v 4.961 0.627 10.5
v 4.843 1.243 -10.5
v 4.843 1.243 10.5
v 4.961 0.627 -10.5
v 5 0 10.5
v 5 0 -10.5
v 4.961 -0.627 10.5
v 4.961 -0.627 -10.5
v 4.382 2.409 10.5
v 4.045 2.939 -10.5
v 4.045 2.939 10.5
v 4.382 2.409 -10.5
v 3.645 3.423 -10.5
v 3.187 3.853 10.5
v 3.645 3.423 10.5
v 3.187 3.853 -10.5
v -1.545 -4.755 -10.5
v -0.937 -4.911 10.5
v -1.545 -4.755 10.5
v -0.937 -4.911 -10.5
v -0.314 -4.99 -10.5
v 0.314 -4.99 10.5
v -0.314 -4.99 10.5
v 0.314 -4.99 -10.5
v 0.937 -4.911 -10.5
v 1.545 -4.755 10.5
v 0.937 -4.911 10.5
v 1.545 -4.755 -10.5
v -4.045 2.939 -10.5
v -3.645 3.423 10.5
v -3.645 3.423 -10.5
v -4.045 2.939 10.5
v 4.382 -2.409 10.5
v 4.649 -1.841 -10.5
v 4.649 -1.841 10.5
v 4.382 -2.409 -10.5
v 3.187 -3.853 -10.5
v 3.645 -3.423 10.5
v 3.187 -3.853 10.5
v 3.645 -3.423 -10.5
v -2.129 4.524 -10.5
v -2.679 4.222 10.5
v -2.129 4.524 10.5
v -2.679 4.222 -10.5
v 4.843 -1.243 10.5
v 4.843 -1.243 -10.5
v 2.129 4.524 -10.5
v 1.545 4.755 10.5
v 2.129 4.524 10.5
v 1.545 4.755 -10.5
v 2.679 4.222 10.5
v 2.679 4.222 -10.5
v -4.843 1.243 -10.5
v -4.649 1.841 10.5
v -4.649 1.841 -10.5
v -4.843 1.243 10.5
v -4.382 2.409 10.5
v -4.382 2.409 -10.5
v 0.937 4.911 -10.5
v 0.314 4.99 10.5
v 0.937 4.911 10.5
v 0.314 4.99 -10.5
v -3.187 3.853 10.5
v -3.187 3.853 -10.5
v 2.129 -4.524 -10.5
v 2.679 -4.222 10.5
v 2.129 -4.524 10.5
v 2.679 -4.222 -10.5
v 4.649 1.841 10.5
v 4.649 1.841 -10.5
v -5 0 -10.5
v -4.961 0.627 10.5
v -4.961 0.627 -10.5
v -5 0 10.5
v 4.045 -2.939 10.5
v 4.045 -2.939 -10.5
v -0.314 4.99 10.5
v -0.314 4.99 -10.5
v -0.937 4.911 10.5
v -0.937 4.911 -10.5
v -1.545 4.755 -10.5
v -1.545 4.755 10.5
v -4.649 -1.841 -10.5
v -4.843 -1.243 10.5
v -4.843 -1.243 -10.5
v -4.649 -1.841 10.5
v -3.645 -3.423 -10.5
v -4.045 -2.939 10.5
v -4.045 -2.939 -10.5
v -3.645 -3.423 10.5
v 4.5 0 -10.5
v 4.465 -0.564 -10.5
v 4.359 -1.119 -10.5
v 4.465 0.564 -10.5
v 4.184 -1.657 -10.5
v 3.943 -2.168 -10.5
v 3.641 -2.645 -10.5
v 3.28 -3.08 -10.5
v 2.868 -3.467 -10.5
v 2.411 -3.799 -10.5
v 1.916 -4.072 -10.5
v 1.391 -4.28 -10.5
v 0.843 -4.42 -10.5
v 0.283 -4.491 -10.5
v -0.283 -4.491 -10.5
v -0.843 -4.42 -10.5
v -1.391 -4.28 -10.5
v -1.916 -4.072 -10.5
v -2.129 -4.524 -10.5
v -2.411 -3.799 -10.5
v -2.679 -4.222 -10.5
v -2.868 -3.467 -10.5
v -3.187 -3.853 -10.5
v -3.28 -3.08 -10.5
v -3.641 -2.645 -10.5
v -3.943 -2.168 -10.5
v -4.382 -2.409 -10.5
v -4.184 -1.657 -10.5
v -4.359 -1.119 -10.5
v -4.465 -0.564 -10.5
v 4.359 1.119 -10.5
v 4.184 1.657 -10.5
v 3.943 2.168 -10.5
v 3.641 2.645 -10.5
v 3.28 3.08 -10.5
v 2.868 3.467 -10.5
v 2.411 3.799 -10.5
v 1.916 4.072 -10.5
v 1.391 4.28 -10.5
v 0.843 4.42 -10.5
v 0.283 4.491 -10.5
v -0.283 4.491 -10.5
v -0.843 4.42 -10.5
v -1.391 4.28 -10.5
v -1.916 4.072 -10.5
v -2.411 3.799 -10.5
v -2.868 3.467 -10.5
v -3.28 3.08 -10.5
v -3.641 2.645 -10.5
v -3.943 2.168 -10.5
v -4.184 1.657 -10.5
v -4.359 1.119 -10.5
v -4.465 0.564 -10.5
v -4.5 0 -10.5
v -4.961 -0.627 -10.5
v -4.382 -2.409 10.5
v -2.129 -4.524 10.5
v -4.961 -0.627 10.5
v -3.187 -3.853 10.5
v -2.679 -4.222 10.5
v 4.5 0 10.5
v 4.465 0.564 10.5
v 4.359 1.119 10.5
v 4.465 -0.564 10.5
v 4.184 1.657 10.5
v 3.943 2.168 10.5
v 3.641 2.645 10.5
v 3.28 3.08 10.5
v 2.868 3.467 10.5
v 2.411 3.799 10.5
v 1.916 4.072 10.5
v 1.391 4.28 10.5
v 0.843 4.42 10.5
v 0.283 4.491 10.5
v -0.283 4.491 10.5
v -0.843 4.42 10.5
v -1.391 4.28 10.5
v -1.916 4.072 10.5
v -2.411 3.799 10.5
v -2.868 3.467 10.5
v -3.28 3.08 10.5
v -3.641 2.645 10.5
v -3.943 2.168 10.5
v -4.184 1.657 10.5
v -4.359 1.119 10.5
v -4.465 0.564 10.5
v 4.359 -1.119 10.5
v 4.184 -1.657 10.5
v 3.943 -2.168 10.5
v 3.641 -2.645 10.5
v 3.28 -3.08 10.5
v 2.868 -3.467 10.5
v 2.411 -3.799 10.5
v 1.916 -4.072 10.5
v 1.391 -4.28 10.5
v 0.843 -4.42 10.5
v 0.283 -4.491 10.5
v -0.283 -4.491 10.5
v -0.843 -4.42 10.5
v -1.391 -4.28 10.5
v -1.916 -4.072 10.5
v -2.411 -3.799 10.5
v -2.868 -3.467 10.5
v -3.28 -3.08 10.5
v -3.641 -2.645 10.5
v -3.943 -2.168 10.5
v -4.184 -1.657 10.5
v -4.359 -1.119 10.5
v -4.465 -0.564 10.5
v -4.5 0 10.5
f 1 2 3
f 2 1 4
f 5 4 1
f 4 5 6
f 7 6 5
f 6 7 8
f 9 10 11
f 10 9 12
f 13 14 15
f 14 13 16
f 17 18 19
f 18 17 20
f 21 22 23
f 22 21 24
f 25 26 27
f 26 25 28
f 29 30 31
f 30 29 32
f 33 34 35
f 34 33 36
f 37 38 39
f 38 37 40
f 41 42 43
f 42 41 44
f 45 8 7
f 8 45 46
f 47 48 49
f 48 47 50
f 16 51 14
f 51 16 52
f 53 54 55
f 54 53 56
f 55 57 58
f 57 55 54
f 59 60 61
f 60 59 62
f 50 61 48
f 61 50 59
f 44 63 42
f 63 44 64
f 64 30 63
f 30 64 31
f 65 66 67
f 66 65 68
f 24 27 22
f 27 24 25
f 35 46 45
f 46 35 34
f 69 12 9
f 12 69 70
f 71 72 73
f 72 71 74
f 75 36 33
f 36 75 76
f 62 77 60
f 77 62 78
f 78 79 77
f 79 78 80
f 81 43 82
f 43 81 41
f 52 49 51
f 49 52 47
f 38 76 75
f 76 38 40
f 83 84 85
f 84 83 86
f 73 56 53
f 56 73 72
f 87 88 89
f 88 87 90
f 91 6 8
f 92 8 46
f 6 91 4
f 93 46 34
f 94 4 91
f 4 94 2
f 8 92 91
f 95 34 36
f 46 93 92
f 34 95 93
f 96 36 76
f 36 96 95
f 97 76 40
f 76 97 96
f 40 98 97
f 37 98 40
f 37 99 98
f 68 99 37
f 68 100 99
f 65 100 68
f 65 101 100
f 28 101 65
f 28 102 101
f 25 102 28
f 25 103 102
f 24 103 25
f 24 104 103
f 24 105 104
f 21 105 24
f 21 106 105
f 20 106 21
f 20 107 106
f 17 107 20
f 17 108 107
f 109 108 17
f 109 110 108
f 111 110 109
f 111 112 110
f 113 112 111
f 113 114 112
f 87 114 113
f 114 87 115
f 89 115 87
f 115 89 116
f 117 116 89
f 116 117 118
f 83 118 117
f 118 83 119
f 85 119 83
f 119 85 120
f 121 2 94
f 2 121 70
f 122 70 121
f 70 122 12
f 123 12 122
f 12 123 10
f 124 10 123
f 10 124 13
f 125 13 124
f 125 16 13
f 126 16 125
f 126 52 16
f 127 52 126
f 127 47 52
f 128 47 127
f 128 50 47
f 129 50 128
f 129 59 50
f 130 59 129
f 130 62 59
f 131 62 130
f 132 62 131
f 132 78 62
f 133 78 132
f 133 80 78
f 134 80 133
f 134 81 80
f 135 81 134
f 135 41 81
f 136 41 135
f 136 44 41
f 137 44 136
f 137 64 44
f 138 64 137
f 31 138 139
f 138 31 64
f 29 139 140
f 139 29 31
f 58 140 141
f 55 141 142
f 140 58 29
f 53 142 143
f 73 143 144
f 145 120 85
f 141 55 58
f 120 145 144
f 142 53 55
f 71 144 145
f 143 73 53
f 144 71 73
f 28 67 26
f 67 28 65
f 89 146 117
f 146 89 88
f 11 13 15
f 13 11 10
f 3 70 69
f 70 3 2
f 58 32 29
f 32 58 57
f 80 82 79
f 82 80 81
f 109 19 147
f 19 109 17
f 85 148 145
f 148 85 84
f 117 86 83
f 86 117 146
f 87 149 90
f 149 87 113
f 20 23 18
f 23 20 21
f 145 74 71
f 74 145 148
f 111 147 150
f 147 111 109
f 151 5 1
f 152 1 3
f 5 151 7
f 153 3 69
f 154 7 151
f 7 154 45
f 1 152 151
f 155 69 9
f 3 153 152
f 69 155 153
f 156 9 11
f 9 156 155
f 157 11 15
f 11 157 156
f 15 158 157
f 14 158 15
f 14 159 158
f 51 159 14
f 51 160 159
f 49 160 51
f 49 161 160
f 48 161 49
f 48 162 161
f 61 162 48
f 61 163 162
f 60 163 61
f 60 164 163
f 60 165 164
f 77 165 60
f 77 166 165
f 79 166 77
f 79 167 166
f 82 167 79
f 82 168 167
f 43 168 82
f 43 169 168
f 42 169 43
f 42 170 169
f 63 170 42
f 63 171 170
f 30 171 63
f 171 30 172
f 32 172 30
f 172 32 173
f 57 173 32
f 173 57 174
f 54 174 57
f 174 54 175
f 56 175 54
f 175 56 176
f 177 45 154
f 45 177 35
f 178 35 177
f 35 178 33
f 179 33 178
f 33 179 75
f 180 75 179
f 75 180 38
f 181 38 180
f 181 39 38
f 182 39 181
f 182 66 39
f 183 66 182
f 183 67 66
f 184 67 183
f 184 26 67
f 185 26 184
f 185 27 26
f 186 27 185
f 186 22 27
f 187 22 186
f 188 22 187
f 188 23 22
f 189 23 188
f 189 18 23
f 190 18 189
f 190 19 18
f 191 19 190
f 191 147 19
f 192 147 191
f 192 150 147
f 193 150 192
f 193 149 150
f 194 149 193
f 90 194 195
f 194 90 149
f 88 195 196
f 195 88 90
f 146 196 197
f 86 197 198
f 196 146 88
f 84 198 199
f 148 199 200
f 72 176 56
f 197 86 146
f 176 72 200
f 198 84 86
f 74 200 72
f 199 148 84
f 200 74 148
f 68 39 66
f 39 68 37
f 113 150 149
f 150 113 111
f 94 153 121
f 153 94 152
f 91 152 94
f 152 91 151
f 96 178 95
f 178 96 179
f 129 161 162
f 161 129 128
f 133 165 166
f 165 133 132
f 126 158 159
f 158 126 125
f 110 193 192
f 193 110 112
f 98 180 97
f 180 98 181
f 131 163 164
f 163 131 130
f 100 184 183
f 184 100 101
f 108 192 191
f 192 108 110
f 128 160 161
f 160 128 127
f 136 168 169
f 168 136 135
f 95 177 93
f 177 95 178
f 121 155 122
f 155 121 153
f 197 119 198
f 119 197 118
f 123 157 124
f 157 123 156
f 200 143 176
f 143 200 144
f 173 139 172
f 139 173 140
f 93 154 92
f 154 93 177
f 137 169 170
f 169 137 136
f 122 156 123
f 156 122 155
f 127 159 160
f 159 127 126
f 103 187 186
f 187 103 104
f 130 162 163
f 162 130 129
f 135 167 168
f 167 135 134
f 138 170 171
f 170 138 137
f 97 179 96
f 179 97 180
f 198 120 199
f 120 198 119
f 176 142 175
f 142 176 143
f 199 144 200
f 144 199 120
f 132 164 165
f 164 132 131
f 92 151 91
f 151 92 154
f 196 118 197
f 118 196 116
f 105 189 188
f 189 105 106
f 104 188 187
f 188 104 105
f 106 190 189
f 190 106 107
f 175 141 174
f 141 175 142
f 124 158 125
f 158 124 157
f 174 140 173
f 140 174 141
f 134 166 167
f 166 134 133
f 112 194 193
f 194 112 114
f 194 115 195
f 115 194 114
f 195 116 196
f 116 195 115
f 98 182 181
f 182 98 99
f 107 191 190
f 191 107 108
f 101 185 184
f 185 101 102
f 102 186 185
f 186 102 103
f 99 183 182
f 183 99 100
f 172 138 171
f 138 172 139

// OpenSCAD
$fn = 50;


difference() {
	union() {
		translate(v = [0, 0, -10.5000000000]) {
			cylinder(h = 21, r = 5.0000000000);
		}
	}
	union() {
		translate(v = [0, 0, -100.0000000000]) {
			cylinder(h = 200, r = 4.5000000000);
		}
	}
}
